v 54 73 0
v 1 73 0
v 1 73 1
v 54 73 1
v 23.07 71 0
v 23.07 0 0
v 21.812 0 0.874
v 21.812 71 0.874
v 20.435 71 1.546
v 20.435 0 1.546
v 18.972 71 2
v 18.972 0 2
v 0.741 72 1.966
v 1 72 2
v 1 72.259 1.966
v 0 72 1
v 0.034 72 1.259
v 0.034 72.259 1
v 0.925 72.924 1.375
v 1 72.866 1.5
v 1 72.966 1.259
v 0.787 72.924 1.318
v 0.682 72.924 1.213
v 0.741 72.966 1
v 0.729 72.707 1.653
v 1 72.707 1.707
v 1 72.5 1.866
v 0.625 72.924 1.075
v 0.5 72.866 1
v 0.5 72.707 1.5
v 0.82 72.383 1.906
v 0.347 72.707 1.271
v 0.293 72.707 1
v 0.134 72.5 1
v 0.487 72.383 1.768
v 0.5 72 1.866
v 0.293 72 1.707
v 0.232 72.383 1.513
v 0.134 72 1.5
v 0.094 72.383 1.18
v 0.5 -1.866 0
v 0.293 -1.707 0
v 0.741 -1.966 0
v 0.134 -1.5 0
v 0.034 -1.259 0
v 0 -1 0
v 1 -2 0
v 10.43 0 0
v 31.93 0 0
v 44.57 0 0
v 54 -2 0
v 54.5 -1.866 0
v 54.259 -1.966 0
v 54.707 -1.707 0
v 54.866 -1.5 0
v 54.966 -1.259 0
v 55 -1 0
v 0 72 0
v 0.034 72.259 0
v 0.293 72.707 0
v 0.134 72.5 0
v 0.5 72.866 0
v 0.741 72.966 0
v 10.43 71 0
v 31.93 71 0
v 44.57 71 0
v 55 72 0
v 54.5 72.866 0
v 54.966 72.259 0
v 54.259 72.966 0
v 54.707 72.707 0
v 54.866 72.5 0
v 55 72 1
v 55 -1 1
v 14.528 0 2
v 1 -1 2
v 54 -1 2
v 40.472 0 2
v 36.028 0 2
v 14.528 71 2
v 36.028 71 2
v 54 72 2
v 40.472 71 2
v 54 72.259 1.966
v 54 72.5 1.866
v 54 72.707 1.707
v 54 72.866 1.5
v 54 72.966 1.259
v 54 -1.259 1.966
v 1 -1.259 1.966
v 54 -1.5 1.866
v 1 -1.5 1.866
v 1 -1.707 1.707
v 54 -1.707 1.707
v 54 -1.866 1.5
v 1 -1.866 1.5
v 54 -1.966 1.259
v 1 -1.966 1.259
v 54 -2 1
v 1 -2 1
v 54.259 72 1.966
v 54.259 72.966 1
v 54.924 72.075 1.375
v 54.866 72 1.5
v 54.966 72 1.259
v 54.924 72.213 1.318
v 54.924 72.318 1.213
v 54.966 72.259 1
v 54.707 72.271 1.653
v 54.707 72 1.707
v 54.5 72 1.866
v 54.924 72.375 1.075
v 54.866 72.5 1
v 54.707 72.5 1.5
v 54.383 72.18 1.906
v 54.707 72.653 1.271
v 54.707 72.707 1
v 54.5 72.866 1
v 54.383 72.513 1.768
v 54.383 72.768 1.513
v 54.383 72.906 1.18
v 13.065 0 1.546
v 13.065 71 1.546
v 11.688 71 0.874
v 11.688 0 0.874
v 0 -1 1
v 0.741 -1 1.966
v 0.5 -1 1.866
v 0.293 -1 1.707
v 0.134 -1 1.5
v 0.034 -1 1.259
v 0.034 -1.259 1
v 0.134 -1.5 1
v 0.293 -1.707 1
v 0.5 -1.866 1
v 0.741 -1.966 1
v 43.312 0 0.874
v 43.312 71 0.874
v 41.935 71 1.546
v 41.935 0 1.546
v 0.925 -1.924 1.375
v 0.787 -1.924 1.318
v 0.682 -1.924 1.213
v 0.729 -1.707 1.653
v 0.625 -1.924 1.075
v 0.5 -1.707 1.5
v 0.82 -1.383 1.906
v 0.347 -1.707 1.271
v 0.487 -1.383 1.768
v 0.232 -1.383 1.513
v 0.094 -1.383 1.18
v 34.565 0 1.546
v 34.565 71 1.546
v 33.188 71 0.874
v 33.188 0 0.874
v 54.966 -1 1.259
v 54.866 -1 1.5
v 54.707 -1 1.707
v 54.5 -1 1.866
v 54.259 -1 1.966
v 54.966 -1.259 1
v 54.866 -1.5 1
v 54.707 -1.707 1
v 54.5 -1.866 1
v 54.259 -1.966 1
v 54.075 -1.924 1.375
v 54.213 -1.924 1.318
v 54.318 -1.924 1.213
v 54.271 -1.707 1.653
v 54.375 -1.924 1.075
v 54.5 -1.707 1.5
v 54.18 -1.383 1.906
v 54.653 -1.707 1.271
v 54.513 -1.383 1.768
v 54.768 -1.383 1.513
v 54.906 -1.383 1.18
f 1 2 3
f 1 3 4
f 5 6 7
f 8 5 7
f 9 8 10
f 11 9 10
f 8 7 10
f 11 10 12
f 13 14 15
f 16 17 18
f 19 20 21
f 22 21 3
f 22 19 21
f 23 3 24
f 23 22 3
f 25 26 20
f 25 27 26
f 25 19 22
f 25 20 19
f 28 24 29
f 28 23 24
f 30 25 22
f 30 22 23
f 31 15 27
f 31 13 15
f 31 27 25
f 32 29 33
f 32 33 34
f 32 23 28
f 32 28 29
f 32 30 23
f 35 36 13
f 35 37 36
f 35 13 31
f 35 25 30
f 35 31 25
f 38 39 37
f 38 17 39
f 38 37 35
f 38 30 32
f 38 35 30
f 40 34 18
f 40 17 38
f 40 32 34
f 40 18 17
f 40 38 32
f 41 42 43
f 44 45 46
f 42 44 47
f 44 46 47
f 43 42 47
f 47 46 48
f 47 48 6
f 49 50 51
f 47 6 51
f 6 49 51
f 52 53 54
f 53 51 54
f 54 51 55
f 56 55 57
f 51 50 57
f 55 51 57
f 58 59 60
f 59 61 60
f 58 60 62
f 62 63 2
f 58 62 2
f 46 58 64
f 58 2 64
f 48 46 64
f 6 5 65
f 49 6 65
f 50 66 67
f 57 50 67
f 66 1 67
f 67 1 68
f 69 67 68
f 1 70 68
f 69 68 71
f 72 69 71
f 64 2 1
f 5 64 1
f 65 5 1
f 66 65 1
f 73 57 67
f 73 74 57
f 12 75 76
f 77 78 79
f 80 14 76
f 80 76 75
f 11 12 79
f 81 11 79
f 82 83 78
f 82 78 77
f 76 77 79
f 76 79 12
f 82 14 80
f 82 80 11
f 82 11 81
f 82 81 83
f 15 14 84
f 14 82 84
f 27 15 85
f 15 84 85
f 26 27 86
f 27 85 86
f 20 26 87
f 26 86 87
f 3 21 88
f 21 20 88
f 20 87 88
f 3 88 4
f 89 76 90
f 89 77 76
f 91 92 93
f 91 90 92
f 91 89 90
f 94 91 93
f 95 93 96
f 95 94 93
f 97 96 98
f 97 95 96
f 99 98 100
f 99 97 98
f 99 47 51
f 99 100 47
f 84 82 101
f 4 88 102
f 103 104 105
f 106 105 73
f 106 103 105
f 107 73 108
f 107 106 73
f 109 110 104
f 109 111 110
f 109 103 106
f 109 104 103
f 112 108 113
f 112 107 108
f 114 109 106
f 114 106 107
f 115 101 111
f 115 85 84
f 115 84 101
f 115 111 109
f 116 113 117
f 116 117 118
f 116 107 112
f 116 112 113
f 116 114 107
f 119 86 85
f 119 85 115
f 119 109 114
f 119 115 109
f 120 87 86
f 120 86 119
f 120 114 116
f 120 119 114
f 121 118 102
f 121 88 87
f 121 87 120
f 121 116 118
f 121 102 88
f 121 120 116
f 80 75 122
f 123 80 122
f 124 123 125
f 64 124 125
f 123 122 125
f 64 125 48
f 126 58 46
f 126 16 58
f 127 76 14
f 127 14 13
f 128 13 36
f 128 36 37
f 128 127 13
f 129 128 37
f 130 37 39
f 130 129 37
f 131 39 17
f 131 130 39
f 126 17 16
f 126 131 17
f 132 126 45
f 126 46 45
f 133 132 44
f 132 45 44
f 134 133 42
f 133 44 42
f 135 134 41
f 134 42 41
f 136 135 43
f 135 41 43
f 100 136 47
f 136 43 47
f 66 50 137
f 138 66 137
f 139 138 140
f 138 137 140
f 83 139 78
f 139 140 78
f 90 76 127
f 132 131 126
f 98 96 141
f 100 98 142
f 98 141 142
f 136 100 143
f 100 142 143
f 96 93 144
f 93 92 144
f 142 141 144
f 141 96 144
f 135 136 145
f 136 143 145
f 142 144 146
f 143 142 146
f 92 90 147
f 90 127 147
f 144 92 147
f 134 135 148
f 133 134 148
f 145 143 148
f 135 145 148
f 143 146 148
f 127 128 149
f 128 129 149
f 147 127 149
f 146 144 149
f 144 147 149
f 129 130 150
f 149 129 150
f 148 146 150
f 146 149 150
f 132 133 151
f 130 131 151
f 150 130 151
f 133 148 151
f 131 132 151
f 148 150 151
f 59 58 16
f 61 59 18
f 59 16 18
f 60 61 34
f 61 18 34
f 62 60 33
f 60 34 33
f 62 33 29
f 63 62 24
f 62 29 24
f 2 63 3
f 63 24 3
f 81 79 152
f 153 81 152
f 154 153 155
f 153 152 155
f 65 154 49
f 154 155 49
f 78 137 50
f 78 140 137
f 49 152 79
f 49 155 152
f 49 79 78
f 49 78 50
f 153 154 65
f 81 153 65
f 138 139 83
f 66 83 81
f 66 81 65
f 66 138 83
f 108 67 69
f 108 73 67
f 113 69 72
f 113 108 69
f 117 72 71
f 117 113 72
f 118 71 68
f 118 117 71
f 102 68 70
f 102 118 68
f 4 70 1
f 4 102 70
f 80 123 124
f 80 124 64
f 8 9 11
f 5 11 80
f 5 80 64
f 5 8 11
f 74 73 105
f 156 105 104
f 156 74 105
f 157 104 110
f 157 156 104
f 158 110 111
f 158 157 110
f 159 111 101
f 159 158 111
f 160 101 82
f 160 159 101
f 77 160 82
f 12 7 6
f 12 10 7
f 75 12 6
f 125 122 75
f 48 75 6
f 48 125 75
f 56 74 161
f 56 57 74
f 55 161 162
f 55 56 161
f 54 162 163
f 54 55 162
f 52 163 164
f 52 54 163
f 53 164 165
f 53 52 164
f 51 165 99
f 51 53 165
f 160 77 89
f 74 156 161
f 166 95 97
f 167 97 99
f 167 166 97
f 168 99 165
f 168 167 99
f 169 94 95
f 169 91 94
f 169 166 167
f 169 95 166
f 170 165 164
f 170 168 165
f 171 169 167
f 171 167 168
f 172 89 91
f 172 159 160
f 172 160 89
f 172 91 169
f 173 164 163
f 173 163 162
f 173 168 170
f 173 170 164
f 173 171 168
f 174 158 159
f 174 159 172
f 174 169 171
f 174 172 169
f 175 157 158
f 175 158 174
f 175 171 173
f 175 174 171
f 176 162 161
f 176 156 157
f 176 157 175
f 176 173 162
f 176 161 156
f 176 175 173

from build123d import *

# Parameters (mm, degrees)
F0_W     = 55
F0_H     = 73
F1_DEPTH = 2
F3_DEPTH = 71
F5_DEPTH = 2
F6_R     = 1


with BuildPart() as f1:
    # F0 (on Top) → F1 (new body)
    with BuildSketch(Plane.XY):
        with Locations((27.5, 36.5)):
            Rectangle(F0_W, F0_H)
    extrude(amount=F1_DEPTH)

    # F2 (on face) → F3 (cut)
    with BuildSketch(Plane.XZ):
        with BuildLine():
            ThreePointArc((36.0279513957, 2), (33.8636583719, 1.2366571717), (31.9303876701, 0))
            Line((31.9303876701, 0), (44.5696123299, 0))
            ThreePointArc((44.5696123299, 0), (42.6363416281, 1.2366571717), (40.4720486043, 2))
            Line((40.4720486043, 2), (36.0279513957, 2))
        make_face()
        with BuildLine():
            Line((10.4303876701, 0), (23.0696123299, 0))
            ThreePointArc((23.0696123299, 0), (21.1363416281, 1.2366571717), (18.9720486043, 2))
            Line((18.9720486043, 2), (14.5279513957, 2))
            ThreePointArc((14.5279513957, 2), (12.3636583719, 1.2366571717), (10.4303876701, 0))
        make_face()
    extrude(amount=-F3_DEPTH, mode=Mode.SUBTRACT)

    # F4 (on face) → F5 (join)
    with BuildSketch(Plane.XY.offset(2)):
        Polygon((55, -2), (55, 0), (40.4720486043, 0), (36.0279513957, 0), (18.9720486043, 0), (14.5279513957, 0), (0, 0), (0, -2), align=None)
    extrude(amount=-F5_DEPTH)

    # F6
    f6_edges = [f1.edges().sort_by_distance(p)[0] for p in [
        (0, 35.5, 2),
        (27.5, 73, 2),
        (55, 35.5, 2),
        (27.5, -2, 2),
        (55, 73, 1),
        (0, 73, 1),
        (0, -2, 1),
        (55, -2, 1),
    ]]
    fillet(f6_edges, radius=F6_R)


solid = f1.part
